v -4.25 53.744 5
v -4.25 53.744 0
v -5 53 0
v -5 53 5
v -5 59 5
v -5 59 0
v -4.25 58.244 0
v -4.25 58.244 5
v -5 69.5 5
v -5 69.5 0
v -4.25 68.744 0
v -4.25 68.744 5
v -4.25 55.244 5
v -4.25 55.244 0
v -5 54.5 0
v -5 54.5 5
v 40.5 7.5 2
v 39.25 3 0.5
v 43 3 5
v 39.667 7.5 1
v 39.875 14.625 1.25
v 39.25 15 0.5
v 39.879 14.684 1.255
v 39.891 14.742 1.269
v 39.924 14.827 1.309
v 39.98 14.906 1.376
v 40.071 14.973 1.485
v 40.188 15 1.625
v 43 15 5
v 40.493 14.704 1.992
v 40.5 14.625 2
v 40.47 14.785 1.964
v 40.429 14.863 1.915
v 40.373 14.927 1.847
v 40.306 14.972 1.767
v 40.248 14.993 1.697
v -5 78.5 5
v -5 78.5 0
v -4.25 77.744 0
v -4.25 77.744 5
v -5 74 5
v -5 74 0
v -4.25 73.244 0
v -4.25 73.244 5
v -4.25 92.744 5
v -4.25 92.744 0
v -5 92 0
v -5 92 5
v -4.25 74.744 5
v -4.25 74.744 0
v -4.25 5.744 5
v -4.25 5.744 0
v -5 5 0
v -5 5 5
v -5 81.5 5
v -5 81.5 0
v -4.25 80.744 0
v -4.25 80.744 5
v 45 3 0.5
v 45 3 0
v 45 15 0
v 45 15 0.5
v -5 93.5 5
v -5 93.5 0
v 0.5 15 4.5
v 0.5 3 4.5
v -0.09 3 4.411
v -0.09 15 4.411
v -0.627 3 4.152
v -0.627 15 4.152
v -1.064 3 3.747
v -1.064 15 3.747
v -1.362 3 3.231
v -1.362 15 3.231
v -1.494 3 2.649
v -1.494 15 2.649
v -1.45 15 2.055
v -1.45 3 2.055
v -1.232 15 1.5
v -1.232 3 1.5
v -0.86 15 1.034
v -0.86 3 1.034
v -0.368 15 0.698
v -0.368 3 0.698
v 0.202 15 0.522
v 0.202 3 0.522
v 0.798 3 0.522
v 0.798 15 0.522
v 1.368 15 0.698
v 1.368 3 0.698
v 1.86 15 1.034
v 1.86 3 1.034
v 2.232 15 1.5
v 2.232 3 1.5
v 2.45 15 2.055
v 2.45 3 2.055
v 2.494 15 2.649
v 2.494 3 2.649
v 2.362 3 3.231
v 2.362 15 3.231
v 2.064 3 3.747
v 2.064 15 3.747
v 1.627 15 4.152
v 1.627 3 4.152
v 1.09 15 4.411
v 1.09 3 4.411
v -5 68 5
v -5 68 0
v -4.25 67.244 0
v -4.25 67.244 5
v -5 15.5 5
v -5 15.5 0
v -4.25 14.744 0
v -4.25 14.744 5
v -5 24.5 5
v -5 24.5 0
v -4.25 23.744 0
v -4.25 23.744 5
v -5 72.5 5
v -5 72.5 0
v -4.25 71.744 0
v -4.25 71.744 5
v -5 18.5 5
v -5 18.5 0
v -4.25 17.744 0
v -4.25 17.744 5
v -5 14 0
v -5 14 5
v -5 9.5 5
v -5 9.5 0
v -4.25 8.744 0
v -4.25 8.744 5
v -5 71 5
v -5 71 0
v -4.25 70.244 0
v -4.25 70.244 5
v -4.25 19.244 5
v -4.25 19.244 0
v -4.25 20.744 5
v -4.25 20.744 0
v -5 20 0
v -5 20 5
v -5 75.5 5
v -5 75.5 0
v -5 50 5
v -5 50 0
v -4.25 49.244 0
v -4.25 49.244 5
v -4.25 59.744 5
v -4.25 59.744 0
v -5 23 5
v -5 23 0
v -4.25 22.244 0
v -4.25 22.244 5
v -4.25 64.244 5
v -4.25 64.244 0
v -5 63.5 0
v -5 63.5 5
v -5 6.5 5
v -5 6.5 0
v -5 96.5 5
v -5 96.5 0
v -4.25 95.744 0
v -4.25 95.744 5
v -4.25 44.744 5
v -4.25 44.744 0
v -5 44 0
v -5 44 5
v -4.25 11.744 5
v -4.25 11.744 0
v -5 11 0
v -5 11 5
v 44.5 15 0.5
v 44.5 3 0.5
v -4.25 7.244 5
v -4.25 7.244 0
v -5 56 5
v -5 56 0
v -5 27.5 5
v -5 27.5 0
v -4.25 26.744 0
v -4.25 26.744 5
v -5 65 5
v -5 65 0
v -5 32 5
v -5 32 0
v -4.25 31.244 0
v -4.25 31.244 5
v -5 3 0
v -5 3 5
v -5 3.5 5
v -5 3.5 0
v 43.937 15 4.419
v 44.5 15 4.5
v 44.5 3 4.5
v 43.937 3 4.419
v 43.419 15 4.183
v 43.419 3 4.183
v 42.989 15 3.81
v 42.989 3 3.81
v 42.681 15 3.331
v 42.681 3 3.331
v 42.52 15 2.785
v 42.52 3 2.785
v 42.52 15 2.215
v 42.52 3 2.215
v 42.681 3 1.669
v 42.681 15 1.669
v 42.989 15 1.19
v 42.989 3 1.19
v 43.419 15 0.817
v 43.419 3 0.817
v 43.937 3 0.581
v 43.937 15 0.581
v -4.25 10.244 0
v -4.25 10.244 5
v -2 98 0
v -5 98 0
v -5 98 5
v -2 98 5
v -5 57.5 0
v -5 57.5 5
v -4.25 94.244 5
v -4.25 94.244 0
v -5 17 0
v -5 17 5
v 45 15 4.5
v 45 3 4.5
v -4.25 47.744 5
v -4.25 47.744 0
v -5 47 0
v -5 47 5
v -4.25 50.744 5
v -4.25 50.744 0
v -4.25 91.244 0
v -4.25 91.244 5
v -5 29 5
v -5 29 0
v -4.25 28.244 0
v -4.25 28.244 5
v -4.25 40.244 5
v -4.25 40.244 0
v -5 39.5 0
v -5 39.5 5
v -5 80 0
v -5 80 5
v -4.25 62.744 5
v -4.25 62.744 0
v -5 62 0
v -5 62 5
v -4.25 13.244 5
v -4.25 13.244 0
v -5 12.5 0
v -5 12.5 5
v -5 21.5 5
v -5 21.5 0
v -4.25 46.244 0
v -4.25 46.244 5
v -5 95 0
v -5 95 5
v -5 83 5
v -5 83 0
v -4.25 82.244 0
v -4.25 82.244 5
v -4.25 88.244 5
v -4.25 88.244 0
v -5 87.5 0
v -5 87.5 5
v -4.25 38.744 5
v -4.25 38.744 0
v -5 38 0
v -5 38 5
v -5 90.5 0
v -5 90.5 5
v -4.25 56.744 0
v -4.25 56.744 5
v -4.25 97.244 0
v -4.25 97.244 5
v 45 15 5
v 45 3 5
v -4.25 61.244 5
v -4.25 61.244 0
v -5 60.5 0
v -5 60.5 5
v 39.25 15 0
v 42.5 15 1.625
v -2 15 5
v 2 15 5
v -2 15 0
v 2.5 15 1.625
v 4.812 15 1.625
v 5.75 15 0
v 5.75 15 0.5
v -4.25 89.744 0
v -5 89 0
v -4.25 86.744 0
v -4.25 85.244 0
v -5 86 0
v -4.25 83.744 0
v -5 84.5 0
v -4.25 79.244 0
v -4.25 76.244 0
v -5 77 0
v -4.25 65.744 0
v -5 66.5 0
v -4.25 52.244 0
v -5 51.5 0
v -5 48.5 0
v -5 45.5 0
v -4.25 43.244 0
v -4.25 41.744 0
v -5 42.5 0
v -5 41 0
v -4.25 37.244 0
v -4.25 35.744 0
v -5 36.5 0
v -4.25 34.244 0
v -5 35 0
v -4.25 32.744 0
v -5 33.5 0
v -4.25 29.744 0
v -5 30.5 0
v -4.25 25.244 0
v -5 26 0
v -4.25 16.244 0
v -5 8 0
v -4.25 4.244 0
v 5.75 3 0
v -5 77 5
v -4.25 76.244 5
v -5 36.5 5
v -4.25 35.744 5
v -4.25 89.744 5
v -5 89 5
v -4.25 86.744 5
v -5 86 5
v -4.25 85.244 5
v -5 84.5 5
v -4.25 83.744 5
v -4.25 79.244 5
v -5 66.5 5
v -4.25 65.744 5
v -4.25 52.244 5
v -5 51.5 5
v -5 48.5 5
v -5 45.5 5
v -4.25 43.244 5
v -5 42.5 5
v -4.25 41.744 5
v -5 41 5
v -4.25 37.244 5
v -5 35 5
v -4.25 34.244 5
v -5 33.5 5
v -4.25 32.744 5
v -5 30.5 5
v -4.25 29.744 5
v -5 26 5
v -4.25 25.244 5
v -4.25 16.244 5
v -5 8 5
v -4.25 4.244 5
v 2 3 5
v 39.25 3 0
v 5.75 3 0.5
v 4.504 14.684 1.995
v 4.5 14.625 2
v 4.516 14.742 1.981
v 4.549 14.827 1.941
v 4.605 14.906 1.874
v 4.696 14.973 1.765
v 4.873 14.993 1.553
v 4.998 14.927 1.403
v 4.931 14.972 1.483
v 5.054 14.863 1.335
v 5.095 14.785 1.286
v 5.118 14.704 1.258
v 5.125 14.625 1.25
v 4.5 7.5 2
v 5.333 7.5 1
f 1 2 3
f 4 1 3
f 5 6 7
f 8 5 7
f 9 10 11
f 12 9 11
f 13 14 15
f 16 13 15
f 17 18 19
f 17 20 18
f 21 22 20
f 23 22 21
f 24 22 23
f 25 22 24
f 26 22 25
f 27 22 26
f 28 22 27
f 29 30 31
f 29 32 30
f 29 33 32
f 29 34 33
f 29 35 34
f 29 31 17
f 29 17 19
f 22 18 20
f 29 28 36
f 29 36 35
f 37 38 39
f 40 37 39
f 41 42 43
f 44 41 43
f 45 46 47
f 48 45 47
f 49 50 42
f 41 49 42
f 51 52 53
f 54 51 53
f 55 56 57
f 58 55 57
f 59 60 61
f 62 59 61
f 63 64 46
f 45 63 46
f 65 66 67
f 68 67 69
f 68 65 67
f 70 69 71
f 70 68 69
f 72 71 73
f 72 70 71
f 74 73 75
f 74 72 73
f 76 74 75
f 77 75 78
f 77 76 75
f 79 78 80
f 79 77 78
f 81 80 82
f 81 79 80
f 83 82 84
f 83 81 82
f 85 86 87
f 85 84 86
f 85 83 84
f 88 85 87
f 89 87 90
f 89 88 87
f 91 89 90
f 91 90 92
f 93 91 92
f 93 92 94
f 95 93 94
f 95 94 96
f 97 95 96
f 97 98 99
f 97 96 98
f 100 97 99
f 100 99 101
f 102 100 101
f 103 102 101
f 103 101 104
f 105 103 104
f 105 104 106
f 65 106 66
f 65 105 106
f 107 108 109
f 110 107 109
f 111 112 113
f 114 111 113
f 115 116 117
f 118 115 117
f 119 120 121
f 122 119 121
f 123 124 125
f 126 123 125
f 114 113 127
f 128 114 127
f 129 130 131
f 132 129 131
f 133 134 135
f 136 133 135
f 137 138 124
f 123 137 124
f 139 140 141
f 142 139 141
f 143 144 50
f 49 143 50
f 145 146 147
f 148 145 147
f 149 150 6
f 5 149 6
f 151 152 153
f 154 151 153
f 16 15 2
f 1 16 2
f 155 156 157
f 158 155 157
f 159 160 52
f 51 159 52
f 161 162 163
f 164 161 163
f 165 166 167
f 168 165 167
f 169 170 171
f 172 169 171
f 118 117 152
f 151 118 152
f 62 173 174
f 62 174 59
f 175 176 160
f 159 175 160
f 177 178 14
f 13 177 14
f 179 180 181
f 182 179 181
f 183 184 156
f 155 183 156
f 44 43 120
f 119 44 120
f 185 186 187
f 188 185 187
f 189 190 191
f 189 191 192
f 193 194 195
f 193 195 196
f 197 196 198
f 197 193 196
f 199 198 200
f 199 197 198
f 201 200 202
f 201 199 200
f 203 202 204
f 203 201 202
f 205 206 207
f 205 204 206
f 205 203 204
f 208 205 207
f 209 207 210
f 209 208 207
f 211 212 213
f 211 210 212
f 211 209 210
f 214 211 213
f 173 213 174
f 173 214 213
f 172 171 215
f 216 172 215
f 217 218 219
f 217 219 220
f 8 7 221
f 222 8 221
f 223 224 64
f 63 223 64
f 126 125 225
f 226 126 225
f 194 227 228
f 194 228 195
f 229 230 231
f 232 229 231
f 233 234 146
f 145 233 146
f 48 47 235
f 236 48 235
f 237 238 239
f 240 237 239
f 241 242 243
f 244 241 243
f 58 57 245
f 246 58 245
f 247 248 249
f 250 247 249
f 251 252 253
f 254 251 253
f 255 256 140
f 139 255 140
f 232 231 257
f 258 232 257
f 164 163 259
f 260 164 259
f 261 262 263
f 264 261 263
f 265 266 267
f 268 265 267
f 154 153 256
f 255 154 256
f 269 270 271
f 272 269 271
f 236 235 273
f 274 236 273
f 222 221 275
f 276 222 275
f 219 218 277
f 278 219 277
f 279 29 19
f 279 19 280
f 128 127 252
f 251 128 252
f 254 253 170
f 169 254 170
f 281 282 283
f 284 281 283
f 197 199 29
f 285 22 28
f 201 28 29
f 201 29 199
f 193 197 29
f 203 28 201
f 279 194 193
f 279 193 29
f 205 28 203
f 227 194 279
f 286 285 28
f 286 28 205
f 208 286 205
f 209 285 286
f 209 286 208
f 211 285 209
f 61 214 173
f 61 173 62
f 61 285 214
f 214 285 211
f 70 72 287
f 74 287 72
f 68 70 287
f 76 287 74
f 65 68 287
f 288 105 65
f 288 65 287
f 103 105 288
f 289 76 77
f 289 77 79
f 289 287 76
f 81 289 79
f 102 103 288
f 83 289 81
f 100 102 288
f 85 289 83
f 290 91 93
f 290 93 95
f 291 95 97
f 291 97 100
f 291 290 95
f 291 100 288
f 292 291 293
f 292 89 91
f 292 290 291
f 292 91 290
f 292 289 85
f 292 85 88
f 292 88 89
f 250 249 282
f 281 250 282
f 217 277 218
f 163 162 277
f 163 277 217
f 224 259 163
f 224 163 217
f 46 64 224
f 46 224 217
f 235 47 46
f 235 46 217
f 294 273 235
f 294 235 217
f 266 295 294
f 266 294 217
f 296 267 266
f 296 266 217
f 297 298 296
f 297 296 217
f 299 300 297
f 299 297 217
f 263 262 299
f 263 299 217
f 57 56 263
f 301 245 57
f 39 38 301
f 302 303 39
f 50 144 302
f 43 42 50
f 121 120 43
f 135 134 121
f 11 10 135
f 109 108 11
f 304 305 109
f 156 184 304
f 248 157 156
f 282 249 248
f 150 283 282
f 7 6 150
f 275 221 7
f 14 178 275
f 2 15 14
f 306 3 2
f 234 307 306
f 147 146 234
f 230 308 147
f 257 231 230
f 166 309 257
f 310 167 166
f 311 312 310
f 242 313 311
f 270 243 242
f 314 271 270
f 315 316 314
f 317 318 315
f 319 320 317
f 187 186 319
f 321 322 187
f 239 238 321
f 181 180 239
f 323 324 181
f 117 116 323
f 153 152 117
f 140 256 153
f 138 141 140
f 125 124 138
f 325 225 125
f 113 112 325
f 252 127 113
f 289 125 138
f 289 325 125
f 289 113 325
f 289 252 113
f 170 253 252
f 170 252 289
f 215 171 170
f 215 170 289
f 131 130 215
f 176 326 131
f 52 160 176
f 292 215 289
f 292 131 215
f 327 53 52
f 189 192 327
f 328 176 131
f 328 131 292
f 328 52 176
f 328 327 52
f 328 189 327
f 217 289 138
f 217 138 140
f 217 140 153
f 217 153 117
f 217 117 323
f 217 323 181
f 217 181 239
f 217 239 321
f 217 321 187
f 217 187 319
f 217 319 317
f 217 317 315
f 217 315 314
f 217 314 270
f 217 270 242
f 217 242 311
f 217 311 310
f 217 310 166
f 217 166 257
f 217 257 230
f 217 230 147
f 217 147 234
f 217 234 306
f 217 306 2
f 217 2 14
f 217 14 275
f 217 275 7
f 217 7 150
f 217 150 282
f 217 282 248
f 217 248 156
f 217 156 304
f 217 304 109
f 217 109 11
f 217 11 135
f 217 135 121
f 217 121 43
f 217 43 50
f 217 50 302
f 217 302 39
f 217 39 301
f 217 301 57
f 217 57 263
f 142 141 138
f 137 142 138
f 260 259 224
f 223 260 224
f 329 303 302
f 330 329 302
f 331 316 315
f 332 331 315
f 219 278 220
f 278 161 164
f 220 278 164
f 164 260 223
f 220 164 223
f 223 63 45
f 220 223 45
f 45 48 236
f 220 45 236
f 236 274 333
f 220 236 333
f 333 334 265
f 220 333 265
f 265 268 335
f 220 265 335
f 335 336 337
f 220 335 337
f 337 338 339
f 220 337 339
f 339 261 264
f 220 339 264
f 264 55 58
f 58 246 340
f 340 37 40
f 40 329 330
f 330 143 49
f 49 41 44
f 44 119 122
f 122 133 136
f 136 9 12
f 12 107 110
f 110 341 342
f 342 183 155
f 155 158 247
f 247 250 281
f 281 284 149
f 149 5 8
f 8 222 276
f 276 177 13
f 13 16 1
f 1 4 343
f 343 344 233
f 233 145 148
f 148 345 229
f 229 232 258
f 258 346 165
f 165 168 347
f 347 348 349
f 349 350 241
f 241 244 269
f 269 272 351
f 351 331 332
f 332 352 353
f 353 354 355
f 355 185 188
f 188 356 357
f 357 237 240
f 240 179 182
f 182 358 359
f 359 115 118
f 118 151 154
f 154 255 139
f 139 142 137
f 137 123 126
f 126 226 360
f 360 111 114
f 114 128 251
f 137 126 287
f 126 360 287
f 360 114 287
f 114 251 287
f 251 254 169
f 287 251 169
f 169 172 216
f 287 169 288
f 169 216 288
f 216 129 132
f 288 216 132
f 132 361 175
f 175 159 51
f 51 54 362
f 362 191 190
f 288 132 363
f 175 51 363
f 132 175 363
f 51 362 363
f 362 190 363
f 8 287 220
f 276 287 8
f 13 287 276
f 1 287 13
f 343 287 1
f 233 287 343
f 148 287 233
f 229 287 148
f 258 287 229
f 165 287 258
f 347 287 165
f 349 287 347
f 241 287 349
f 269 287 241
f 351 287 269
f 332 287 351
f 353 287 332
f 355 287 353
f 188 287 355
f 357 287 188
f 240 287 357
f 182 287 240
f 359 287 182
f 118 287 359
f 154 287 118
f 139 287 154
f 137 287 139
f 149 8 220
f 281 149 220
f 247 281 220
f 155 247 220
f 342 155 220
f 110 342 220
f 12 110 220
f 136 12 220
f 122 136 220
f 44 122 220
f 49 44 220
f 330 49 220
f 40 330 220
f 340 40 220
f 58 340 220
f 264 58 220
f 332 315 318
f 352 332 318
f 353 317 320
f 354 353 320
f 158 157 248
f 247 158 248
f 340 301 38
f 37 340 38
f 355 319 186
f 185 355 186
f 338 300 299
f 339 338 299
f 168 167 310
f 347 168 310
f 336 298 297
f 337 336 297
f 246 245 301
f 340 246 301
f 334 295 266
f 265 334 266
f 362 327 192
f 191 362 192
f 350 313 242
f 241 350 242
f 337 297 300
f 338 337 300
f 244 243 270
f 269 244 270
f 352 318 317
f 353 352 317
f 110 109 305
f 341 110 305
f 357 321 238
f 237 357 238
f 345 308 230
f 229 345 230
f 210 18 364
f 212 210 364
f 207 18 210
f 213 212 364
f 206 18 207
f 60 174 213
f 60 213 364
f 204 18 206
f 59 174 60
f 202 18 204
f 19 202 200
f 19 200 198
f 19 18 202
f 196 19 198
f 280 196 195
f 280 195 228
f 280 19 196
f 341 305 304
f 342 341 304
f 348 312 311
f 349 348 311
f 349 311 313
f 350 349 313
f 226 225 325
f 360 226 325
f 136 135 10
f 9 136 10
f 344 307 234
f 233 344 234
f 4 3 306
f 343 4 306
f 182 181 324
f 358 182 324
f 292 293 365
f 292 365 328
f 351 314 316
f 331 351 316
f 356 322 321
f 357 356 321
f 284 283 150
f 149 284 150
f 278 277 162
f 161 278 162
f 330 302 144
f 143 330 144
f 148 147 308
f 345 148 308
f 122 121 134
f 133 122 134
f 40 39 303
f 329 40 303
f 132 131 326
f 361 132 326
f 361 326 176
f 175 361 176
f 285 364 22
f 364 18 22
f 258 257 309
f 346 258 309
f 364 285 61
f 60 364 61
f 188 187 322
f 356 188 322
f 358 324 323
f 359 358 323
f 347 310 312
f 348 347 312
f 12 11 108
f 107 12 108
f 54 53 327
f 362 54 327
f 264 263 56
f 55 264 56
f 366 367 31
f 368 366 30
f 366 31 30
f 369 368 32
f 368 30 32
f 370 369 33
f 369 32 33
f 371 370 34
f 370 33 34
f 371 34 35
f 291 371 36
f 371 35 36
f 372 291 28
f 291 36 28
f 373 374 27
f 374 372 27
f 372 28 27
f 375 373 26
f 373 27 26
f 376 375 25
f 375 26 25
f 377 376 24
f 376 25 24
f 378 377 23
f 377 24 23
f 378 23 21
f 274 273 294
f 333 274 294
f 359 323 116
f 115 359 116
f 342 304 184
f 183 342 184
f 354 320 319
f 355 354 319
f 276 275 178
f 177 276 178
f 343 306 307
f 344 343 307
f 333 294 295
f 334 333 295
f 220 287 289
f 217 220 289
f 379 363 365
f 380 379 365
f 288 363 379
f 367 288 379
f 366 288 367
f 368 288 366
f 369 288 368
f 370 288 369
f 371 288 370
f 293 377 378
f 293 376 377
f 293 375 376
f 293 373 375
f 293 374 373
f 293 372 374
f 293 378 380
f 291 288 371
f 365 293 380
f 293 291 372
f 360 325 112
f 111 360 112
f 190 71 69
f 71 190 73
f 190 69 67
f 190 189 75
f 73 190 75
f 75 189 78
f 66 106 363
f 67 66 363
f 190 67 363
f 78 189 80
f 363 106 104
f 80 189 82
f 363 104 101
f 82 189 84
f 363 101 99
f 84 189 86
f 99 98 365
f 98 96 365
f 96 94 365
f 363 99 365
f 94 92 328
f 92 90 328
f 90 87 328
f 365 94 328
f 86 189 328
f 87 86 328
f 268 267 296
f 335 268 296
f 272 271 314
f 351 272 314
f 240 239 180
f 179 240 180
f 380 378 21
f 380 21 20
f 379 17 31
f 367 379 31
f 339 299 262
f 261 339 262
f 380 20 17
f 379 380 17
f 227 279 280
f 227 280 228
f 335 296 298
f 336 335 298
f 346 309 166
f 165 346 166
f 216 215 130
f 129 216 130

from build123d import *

# Parameters (mm, degrees)
ESQUISSE1_W                = 45
ESQUISSE1_H                = 15
BOSS_EXTRU_1_DEPTH         = 0.5
BOSS_EXTRU_2_DEPTH         = 15
ESQUISSE3_W                = 33.5
ESQUISSE3_H                = 7.5
ENL_V_MAT_EXTRU_1_DEPTH    = 48.647140523
BOSS_EXTRU_5_DEPTH         = 20
BOSS_EXTRU_5_DEPTH_BACK    = 20
ESQUISSE10_W               = 64.680470467
ESQUISSE10_H               = 24.042247858
ENL_V_MAT_EXTRU_3_DEPTH    = 3
ESQUISSE11_W               = 33.5
ESQUISSE11_H               = 0.5
ENL_V_MAT_EXTRU_4_DEPTH    = 47.840153715
ESQUISSE12_W               = 10.593660794
ESQUISSE12_H               = 24.624800323
ENL_V_MAT_EXTRU_5_DEPTH    = 0.5
BOSS_EXTRU_6_DEPTH         = 12
BOSS_EXTRU_7_DEPTH         = 83
BOSS_EXTRU_7_DEPTH_BACK    = 12
ESQUISSE13_3_W             = 3
ESQUISSE13_3_H             = 5
ENL_V_MAT_EXTRU_6_DEPTH    = 185
R_P_TITION_LIN_AIRE2_COUNT = 63
R_P_TITION_LIN_AIRE2_PITCH = 1.5
ESQUISSE8_W                = 33.5
ESQUISSE8_H                = 3
ENL_V_MAT_EXTRU_2_DEPTH    = 0.5


with BuildPart() as part:
    # Esquisse1 → Boss.-Extru.1 (new body)
    with BuildSketch(Plane.XY):
        with Locations((22.5, 7.5)):
            Rectangle(ESQUISSE1_W, ESQUISSE1_H)
    extrude(amount=BOSS_EXTRU_1_DEPTH)

    # Esquisse2 → Boss.-Extru.2 (add)
    with BuildSketch(Plane(origin=(0, 15, 0), x_dir=(1, 0, 0), z_dir=(0, 1, 0))):
        with BuildLine():
            ThreePointArc((0.5, -0.5), (2.5, -2.5), (0.5, -4.5))
            Line((0.5, -4.5), (0, -4.5))
            Line((0, -4.5), (0, -5))
            Line((0, -5), (0.5, -5))
            Line((0.5, -5), (2, -5))
            Line((2, -5), (5.75, -0.5))
            Line((5.75, -0.5), (0.5, -0.5))
        make_face()
        with BuildLine():
            Line((44.5, -0.5), (39.25, -0.5))
            Line((39.25, -0.5), (43, -5))
            Line((43, -5), (44.5, -5))
            Line((44.5, -5), (45, -5))
            Line((45, -5), (45, -4.5))
            Line((45, -4.5), (44.5, -4.5))
            ThreePointArc((44.5, -4.5), (42.5, -2.5), (44.5, -0.5))
        make_face()
    extrude(amount=-BOSS_EXTRU_2_DEPTH)

    # Esquisse3 → Enlèv. mat.-Extru.1 (cut, through all)
    with BuildSketch(Plane.XY.offset(0.5)):
        with Locations((22.5, 3.75)):
            Rectangle(ESQUISSE3_W, ESQUISSE3_H)
    extrude(amount=-ENL_V_MAT_EXTRU_1_DEPTH, mode=Mode.SUBTRACT)

    # Esquisse7 → Boss.-Extru.5 (add, two sides: drawn at the far end of the back side and taken through both)
    with BuildSketch(Plane.ZY.offset(-22.5).offset(-BOSS_EXTRU_5_DEPTH_BACK)):
        with BuildLine():
            Line((1, 7.5), (2, 7.5))
            Line((2, 7.5), (2, 14.625))
            ThreePointArc((2, 14.625), (1.625, 15), (1.25, 14.625))
            Line((1.25, 14.625), (1, 7.5))
        make_face()
    extrude(amount=BOSS_EXTRU_5_DEPTH + BOSS_EXTRU_5_DEPTH_BACK)

    # Esquisse10 → Enlèv. mat.-Extru.3 (cut)
    with BuildSketch(Plane.XZ):
        with Locations((25.714759003, 2.202104928)):
            Rectangle(ESQUISSE10_W, ESQUISSE10_H)
    extrude(amount=-ENL_V_MAT_EXTRU_3_DEPTH, mode=Mode.SUBTRACT)

    # Esquisse11 → Enlèv. mat.-Extru.4 (cut, through all)
    with BuildSketch(Plane(origin=(0, 15, 0), x_dir=(1, 0, 0), z_dir=(0, 1, 0))):
        with Locations((22.5, -0.25)):
            Rectangle(ESQUISSE11_W, ESQUISSE11_H)
    extrude(amount=-ENL_V_MAT_EXTRU_4_DEPTH, mode=Mode.SUBTRACT)

    # Esquisse12 → Enlèv. mat.-Extru.5 (cut)
    with BuildSketch(Plane.ZY):
        with Locations((2.946764515, 5.852855815)):
            Rectangle(ESQUISSE12_W, ESQUISSE12_H)
    extrude(amount=-ENL_V_MAT_EXTRU_5_DEPTH, mode=Mode.SUBTRACT)

    # Esquisse13 → Boss.-Extru.6 (add)
    with BuildSketch(Plane(origin=(0, 15, 0), x_dir=(1, 0, 0), z_dir=(0, 1, 0))):
        with BuildLine():
            Line((-2, -5), (0.5, -5))
            Line((0.5, -5), (0.5, -4.5))
            ThreePointArc((0.5, -4.5), (-1.5, -2.5), (0.5, -0.5))
            Line((0.5, -0.5), (0.5, 0))
            Line((0.5, 0), (-2, 0))
            Line((-2, 0), (-2, -5))
        make_face()
    extrude(amount=-BOSS_EXTRU_6_DEPTH)

    # Esquisse13<3> → Boss.-Extru.7 (add, two sides: drawn at the far end of the back side and taken through both)
    with BuildSketch(Plane(origin=(0, 15, 0), x_dir=(1, 0, 0), z_dir=(0, 1, 0)).offset(-BOSS_EXTRU_7_DEPTH_BACK)):
        with Locations((-3.5, -2.5)):
            Rectangle(ESQUISSE13_3_W, ESQUISSE13_3_H)
    extrude(amount=BOSS_EXTRU_7_DEPTH + BOSS_EXTRU_7_DEPTH_BACK)

    # Esquisse14 → Enlèv. mat.-Extru.6 (cut)
    with BuildSketch(Plane(origin=(0, 0, 0), x_dir=(-1, 0, 0), z_dir=(0, 0, -1))):
        Polygon((5, 98), (4.250024873, 97.243891844), (5, 96.5), align=None)
    enl_v_mat_extru_6 = extrude(amount=-ENL_V_MAT_EXTRU_6_DEPTH, mode=Mode.SUBTRACT)

    # Répétition linéaire2: Enlèv. mat.-Extru.6 ×63
    with Locations(*[(0, -i * R_P_TITION_LIN_AIRE2_PITCH, 0) for i in range(1, R_P_TITION_LIN_AIRE2_COUNT)]):
        add(enl_v_mat_extru_6, mode=Mode.SUBTRACT)

    # Esquisse8 → Enlèv. mat.-Extru.2 (cut)
    with BuildSketch(Plane(origin=(0, 0, 0), x_dir=(-1, 0, 0), z_dir=(0, 0, -1))):
        with Locations((-22.5, 9)):
            Rectangle(ESQUISSE8_W, ESQUISSE8_H)
    extrude(amount=-ENL_V_MAT_EXTRU_2_DEPTH, mode=Mode.SUBTRACT)


solid = part.part
